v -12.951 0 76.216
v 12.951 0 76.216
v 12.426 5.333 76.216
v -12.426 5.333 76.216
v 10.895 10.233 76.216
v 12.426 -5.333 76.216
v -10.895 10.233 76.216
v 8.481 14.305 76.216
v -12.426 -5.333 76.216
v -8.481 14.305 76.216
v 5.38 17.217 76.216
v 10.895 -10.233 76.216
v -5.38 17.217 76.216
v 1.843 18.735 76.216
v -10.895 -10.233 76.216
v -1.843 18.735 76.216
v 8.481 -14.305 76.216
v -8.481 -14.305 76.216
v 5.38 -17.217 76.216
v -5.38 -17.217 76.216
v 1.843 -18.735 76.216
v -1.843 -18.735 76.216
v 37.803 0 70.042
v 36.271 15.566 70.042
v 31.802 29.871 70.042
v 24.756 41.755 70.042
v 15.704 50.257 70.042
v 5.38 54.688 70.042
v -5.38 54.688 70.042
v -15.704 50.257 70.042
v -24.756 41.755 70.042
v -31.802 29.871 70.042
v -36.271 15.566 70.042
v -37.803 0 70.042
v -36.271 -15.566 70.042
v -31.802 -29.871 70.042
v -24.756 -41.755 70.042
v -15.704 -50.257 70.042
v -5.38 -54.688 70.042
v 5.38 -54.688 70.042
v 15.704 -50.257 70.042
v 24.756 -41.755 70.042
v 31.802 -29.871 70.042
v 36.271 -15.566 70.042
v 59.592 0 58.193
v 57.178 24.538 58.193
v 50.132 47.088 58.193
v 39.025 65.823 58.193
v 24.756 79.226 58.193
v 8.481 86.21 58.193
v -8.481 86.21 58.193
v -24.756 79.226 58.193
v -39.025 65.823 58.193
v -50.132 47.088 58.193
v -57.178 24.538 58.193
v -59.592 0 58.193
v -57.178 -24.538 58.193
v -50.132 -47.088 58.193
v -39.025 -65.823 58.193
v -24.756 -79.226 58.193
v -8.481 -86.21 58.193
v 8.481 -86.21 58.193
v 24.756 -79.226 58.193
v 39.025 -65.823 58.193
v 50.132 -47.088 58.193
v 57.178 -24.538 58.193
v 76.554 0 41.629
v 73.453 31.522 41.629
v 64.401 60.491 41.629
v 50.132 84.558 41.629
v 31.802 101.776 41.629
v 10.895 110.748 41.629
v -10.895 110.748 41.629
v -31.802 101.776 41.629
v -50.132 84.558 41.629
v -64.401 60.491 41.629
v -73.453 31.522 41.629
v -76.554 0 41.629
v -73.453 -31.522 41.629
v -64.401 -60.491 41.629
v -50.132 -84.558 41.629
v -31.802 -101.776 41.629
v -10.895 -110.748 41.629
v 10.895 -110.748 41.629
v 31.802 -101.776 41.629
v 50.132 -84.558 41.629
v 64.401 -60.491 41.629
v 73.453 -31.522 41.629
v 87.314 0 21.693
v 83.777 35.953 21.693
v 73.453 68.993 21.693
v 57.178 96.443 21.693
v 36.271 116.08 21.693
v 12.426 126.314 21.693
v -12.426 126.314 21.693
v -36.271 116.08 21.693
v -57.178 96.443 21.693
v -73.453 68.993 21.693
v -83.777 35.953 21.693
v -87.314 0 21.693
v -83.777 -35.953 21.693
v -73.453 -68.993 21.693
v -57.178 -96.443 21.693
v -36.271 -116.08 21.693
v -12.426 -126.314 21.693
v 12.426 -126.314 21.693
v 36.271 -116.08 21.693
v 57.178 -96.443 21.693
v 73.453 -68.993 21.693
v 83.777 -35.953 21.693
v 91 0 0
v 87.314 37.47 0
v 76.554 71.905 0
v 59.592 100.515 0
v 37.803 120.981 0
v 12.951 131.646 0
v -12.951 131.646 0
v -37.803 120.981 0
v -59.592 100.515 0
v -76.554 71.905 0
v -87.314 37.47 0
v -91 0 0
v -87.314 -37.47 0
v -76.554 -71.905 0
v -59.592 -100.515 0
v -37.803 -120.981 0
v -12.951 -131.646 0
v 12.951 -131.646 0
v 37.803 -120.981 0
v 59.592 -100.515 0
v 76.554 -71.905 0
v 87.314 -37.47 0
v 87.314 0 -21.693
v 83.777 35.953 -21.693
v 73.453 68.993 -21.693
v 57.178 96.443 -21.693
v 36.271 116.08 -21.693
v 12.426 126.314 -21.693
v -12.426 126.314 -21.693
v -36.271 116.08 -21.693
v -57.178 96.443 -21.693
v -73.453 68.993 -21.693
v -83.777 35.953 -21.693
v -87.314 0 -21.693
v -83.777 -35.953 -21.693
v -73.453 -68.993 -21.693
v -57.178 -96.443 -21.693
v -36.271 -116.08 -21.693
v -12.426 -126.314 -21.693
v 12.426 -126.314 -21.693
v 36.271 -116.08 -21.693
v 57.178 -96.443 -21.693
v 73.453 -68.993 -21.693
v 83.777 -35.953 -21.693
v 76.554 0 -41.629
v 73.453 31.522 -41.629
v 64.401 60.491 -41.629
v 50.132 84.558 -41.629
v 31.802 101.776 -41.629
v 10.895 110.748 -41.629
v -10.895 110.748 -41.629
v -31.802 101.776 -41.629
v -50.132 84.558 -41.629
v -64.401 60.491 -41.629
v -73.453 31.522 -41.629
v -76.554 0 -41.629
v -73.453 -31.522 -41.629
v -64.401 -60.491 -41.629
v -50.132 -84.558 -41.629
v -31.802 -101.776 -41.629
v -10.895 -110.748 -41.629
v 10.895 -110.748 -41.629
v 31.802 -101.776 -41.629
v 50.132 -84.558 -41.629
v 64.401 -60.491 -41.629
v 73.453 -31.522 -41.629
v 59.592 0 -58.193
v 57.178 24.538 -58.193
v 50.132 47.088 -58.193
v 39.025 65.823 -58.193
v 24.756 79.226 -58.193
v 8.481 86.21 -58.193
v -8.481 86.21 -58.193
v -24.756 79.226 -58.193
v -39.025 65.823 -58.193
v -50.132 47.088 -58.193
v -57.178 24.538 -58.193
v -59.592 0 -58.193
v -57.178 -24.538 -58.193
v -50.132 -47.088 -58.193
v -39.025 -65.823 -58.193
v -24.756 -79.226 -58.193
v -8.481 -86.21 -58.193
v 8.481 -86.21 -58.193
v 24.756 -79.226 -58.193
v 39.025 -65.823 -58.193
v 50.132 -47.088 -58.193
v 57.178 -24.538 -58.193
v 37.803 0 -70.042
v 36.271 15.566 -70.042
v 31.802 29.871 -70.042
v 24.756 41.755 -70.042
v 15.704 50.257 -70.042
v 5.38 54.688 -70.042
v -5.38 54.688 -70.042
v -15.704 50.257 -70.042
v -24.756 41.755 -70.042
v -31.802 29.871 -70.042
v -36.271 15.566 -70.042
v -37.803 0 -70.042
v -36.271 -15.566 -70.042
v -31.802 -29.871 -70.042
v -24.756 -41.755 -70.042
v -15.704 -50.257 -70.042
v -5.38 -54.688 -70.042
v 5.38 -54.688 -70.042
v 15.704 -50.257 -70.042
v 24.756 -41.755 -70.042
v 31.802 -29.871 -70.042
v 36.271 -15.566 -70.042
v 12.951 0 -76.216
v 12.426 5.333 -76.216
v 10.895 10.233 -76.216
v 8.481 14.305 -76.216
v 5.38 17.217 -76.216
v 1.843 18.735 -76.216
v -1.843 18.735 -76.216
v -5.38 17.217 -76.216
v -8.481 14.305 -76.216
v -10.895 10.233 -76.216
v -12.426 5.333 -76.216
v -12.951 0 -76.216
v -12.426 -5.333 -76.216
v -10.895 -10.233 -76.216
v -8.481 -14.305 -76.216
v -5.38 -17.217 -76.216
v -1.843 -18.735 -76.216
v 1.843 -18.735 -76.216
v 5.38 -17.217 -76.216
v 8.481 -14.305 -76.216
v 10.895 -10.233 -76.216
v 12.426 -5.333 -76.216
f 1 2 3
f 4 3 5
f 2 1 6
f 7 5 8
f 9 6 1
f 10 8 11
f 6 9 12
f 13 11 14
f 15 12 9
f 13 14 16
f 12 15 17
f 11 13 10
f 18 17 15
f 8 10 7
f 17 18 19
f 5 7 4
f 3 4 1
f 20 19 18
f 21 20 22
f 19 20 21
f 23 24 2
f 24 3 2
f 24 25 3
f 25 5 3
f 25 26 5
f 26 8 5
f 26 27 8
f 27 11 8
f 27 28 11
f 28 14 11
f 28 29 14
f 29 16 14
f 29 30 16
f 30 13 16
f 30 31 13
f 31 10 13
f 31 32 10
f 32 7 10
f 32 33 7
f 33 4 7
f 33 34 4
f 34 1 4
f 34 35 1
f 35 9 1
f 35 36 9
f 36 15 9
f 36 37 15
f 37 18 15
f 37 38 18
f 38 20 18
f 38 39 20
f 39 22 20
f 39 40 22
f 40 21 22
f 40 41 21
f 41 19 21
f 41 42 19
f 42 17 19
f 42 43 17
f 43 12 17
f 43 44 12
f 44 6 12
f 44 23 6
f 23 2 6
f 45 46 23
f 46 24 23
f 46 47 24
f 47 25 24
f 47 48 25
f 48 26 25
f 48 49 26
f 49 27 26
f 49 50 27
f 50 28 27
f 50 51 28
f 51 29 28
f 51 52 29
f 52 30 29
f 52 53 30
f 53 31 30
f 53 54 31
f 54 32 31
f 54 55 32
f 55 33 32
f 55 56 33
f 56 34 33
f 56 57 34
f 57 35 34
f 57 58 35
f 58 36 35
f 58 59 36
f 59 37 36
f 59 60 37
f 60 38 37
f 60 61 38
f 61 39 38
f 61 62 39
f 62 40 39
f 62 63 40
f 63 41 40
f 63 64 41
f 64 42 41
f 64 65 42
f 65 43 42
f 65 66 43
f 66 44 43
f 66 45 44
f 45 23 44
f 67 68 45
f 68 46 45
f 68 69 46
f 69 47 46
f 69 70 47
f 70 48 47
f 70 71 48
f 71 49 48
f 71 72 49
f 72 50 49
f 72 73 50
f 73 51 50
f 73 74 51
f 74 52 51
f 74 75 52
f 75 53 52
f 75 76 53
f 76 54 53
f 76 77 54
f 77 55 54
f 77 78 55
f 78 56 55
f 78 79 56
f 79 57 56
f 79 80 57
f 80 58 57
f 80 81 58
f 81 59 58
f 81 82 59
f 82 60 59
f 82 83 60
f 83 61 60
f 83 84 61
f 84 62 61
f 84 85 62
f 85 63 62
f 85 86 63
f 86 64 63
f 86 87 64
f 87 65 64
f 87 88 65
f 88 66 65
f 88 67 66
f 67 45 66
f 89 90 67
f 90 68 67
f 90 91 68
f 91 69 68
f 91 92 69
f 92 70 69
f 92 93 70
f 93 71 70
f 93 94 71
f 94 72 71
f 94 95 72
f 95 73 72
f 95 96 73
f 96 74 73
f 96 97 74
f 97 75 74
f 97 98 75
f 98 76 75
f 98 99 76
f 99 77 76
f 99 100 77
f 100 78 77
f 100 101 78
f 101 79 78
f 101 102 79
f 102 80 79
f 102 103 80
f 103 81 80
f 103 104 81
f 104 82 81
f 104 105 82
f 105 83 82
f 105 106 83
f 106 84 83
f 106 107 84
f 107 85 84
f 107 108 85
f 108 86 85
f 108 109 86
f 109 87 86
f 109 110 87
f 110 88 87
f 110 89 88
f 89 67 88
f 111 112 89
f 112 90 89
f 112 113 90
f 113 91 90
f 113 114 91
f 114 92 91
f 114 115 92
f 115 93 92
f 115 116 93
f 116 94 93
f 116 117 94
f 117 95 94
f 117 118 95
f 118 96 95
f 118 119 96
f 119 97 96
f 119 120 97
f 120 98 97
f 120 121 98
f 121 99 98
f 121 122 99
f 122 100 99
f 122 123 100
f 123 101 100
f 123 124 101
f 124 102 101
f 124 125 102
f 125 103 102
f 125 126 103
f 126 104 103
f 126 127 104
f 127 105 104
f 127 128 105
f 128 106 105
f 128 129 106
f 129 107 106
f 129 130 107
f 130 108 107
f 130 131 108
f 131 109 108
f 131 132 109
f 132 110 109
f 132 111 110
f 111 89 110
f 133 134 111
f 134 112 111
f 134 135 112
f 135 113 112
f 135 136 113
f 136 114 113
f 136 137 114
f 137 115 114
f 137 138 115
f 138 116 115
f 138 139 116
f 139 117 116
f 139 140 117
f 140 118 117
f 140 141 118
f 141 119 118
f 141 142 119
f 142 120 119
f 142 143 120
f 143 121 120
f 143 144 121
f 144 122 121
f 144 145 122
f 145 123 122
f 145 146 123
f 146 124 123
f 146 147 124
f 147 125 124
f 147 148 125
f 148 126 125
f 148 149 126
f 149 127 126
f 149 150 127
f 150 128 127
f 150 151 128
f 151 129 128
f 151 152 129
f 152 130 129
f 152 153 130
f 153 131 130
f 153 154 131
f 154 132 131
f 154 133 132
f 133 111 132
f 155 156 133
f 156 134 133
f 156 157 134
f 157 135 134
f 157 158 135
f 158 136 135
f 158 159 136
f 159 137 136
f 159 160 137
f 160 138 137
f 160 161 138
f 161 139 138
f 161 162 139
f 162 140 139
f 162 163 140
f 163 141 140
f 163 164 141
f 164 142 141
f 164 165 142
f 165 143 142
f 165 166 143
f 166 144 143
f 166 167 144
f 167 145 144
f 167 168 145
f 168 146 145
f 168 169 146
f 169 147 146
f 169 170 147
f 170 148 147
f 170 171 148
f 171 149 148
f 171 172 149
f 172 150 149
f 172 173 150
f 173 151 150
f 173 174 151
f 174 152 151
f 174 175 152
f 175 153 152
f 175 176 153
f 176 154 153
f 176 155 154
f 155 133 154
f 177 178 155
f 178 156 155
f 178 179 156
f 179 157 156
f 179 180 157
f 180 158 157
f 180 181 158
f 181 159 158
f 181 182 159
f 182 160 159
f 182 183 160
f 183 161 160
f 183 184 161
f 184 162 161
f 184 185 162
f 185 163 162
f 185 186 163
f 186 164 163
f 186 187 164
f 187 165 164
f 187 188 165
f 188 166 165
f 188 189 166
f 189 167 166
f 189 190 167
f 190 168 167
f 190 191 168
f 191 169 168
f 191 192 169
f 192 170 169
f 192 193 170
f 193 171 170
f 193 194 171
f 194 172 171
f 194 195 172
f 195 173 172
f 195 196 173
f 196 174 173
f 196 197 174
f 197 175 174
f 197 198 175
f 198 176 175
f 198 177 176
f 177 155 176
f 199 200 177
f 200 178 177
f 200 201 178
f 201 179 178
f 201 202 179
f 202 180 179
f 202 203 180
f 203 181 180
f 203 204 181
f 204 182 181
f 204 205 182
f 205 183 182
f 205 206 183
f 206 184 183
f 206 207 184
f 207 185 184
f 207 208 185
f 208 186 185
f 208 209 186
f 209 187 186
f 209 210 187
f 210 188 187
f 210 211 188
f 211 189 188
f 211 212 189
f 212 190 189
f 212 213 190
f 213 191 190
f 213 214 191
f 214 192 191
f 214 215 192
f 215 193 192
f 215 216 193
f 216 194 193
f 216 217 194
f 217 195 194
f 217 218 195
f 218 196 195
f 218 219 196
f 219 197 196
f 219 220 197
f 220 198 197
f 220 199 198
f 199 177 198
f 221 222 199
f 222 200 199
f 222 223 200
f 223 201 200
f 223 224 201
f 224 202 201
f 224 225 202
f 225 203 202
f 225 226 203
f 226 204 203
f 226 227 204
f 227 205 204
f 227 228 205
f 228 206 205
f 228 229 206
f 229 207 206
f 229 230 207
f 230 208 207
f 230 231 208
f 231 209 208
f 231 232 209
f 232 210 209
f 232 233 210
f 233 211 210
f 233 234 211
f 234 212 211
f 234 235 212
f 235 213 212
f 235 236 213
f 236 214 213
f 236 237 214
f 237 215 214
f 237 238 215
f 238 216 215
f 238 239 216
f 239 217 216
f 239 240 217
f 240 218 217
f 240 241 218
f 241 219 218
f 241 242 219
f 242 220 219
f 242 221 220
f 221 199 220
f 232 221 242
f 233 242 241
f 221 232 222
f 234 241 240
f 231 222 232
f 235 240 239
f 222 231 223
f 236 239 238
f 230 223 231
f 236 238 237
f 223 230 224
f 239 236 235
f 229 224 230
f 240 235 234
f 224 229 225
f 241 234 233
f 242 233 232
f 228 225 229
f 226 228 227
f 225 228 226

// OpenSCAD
// Generated by SolidPython 1.0.1 on 2020-07-29 00:46:51


scale(v = [13, 19, 11]) {
	sphere(r = 7);
}
/***********************************************
*********      SolidPython code:      **********
************************************************
 
# import packages: SolidPython
from solid import *
from solid.utils import *
from itertools import chain, combinations, permutations


class Resize:

    def __init__(self, scad_file):
        self.scad_file = scad_file
        #self.scad_file = import_scad(scad_file)
        # cone/cylinder param:
        self.r1 = 0
        self.r2 = 0
        self.h = 0
        # rectangular prism param:
        self.w = 0
        self.l = 0
        # ellipse param:
        self.r = 0

    # import OpenScad code (file name corresponds to shape)


    # classify shape + parameters
    def assign(self, param1, param2, param3):
        if self.scad_file == 'cone.scad':
            self.r1 = param1
            self.r2 = param2
            self.h = param3
        elif self.scad_file == 'cylinder.scad':
            self.r1 = param1
            self.r2 = param2
            self.h = param3
        elif self.scad_file == 'rectangularPrism.scad':
            self.h = param1
            self.l = param2
            self.w = param3
        else:
            self.r = param1
            self.h = param2

    # resize parameters
    def iterate(self):
        x = range(3, 20, 2)
        i = 1
        if self.scad_file == 'cone.scad':
            tempList = list(permutations(x, 2))
            for temp in tempList:
                param1 = temp[0]
                param2 = temp[1]
                filepath = 'produced_scad_files/' + 'cone' + str(param1) + '_' + str(param2) + '_' + '.scad'
                scad_render_to_file(cylinder(h=param1, r1=param2, r2=0), filepath)

        elif self.scad_file == 'cylinder.scad':
            tempList = list(permutations(x, 3))
            for temp in tempList:
                param1 = temp[0]
                param2 = temp[1]
                filepath = 'produced_scad_files/' + 'cylinder' + str(param1) + '_' + str(param2) + '_' + '.scad'
                scad_render_to_file(cylinder(h=param1, r1=param2, r2=param2), filepath)

        elif self.scad_file == 'rectangularPrism.scad':
            tempList = list(permutations(x, 3))
            for temp in tempList:
                param1 = temp[0]
                param2 = temp[1]
                param3 = temp[2]
                filepath = 'produced_scad_files/' + 'rectangularPrism' + str(param1) + '_' + str(param2) + '_' + str(
                    param3) + '.scad'
                scad_render_to_file(cube(size=(param1, param2, param3)), filepath)

        elif self.scad_file == 'ellipse.scad':
            tempList = list(permutations(x, 4))
            for temp in tempList:
                param1 = temp[0]
                param2 = temp[1]
                param3 = temp[2]
                param4 = temp[3]
                filepath = 'produced_scad_files/' + 'ellipse' + str(param1) + '_' + str(param2) + '_' + str(param3) + '_' + str(param4) + '.scad'
                scad_render_to_file(scale([param1, param2, param3])(sphere(r=param4)), filepath)

    def render_to_scadfile(self):
        scad_render_to_file(scad, 'example.scad') 
 
************************************************/
